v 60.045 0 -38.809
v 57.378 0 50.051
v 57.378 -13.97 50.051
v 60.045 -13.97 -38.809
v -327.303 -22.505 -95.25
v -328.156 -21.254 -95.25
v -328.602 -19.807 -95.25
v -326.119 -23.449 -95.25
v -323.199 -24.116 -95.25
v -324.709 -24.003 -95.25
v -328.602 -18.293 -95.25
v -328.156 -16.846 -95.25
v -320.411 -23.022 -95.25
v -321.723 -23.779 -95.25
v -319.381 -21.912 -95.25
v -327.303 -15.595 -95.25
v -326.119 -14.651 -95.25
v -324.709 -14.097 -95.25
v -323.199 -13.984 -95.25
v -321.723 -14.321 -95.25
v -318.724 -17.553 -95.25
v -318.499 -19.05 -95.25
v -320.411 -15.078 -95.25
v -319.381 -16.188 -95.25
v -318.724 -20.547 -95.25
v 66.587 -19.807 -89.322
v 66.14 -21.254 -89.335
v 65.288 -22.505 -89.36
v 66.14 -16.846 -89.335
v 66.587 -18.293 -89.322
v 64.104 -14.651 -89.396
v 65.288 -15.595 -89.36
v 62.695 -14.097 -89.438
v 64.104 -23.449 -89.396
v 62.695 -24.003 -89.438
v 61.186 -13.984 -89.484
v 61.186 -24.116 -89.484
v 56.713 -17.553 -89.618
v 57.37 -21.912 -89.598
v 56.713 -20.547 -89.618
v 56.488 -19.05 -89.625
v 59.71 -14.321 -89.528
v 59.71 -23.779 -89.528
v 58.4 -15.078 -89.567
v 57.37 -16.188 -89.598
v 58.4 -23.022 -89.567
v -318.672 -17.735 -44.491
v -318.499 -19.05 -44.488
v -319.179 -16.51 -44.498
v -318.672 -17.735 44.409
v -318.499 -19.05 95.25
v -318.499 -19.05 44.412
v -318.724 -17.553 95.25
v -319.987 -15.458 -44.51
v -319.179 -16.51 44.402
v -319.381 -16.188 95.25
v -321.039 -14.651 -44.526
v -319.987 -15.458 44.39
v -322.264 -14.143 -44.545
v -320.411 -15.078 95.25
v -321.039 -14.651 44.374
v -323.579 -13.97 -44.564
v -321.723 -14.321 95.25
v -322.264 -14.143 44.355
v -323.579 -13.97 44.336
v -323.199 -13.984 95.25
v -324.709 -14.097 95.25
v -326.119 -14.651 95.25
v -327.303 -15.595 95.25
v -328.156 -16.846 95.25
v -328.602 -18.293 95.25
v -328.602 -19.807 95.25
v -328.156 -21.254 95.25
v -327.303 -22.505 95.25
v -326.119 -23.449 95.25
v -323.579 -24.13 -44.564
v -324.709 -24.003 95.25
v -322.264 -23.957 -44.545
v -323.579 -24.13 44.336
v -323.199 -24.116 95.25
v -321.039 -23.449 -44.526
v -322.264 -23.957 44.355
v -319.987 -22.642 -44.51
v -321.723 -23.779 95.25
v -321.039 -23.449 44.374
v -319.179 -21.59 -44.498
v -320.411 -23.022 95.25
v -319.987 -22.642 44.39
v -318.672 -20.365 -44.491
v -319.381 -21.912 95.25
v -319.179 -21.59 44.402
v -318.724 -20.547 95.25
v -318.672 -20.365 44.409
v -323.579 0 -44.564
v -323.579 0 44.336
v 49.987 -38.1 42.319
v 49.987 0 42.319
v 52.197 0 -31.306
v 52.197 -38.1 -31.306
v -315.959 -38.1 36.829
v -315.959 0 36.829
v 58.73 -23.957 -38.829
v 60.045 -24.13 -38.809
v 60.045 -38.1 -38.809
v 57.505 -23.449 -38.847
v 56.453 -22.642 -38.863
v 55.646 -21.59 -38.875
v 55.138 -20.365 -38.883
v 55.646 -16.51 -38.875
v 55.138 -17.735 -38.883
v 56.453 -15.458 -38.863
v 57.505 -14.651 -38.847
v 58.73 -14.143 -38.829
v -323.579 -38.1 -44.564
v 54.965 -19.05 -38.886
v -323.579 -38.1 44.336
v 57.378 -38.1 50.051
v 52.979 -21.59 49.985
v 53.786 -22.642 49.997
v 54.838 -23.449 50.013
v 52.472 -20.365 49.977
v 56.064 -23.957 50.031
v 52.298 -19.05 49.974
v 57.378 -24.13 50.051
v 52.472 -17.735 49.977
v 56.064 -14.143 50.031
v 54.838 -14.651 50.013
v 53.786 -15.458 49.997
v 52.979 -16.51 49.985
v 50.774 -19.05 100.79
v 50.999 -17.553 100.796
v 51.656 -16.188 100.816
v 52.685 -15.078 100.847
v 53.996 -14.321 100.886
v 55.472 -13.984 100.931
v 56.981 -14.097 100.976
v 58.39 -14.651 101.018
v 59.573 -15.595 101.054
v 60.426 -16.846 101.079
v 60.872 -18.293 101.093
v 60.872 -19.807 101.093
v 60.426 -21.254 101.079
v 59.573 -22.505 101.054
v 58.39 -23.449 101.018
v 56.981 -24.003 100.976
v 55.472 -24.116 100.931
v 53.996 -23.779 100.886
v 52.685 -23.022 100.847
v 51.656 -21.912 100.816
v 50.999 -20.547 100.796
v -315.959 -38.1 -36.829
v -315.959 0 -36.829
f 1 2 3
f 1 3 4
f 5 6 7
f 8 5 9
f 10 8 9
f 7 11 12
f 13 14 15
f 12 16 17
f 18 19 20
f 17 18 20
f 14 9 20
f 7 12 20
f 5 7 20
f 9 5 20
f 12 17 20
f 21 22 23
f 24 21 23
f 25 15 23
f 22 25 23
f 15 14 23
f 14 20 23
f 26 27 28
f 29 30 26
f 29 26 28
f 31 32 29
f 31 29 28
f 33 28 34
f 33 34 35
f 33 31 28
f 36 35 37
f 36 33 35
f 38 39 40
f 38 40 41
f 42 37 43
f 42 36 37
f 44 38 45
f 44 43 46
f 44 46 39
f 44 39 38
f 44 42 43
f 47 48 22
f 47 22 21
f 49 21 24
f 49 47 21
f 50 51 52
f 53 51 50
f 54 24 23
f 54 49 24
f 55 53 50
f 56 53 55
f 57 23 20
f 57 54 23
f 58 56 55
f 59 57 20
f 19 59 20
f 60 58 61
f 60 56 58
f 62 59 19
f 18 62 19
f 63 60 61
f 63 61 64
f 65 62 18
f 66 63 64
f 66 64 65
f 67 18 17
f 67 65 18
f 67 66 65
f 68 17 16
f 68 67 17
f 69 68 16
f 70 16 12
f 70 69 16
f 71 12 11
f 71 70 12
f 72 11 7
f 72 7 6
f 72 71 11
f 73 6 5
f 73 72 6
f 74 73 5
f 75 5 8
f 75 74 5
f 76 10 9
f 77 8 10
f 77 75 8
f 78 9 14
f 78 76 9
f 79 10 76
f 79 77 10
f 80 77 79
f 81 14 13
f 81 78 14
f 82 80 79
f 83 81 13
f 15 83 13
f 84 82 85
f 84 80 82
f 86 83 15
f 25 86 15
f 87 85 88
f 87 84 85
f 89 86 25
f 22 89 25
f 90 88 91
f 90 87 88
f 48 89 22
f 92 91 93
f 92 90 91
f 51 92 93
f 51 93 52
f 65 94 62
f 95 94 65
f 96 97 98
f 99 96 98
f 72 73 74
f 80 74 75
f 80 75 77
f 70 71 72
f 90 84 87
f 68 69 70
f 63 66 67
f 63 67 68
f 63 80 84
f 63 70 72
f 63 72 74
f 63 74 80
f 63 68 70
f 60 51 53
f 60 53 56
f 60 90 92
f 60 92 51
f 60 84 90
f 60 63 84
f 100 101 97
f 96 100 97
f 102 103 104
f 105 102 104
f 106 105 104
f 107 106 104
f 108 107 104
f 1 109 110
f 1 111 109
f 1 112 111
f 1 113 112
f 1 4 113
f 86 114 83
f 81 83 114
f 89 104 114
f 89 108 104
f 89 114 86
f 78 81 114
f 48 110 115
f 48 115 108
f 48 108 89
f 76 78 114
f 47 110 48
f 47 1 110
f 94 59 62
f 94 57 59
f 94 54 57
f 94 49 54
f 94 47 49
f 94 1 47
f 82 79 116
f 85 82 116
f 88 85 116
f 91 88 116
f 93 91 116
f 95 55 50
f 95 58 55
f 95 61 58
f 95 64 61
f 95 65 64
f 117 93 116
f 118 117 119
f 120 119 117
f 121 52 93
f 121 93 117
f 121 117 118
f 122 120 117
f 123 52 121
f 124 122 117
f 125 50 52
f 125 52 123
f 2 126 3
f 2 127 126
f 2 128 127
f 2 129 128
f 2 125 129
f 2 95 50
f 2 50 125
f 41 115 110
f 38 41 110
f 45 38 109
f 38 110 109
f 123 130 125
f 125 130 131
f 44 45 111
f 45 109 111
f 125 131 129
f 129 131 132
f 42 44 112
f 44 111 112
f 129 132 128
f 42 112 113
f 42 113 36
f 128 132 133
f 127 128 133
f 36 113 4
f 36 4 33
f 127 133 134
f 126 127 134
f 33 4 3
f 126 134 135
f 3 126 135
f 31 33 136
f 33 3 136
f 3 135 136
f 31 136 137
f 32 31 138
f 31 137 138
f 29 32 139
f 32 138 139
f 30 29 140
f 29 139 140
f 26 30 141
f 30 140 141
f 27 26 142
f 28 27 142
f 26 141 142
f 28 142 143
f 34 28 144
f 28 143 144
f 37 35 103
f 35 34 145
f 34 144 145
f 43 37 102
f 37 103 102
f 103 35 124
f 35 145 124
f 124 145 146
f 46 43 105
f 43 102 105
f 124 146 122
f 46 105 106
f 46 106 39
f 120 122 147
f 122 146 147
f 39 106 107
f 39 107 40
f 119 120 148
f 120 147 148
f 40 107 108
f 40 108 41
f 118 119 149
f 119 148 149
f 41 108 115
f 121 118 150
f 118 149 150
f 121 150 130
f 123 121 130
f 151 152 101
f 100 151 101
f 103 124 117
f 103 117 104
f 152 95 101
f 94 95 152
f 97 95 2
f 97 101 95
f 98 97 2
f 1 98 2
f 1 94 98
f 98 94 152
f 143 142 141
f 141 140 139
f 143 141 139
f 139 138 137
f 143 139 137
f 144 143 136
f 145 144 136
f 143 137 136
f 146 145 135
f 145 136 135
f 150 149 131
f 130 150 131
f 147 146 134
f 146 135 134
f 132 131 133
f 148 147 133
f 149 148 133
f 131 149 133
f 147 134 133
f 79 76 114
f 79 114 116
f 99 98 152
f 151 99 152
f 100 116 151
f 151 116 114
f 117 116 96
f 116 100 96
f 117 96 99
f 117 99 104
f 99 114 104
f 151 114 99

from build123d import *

# Parameters (mm, degrees)
BOSS_EXTRUDE1_DEPTH = 38.1
SKETCH2_R           = 5.08
BOSS_EXTRUDE2_DEPTH = 95.25


with BuildPart() as part:
    # Sketch1 → Boss-Extrude1 (new body)
    with BuildSketch(Plane(origin=(0, 0, 0), x_dir=(1, 0, 0), z_dir=(0, 1, 0))):
        Polygon((-323.578651022, -44.335687139), (57.378484067, -50.050687139), (60.045184013, 38.809307861), (-323.578651022, 44.564312861), align=None)
        Polygon((-315.958651022, -36.829142605), (49.987084067, -42.318946269), (52.196584013, 31.306192713), (-315.958651022, 36.829142605), align=None, mode=Mode.SUBTRACT)
    extrude(amount=-BOSS_EXTRUDE1_DEPTH)

    # Sketch2 → Boss-Extrude2 (add, symmetric)
    with BuildSketch(Plane.XY):
        with Locations((-323.578651022, -19.05)):
            Circle(SKETCH2_R)
    boss_extrude2 = extrude(amount=BOSS_EXTRUDE2_DEPTH, both=True)

    # Mirror1: Boss-Extrude2 across plane
    add(boss_extrude2.mirror(Plane(origin=(-132.362317794, 0, -1.985658166), x_dir=(-0.015, 0, 0.999887494), z_dir=(0.999887494, 0, 0.015))))


solid = part.part
